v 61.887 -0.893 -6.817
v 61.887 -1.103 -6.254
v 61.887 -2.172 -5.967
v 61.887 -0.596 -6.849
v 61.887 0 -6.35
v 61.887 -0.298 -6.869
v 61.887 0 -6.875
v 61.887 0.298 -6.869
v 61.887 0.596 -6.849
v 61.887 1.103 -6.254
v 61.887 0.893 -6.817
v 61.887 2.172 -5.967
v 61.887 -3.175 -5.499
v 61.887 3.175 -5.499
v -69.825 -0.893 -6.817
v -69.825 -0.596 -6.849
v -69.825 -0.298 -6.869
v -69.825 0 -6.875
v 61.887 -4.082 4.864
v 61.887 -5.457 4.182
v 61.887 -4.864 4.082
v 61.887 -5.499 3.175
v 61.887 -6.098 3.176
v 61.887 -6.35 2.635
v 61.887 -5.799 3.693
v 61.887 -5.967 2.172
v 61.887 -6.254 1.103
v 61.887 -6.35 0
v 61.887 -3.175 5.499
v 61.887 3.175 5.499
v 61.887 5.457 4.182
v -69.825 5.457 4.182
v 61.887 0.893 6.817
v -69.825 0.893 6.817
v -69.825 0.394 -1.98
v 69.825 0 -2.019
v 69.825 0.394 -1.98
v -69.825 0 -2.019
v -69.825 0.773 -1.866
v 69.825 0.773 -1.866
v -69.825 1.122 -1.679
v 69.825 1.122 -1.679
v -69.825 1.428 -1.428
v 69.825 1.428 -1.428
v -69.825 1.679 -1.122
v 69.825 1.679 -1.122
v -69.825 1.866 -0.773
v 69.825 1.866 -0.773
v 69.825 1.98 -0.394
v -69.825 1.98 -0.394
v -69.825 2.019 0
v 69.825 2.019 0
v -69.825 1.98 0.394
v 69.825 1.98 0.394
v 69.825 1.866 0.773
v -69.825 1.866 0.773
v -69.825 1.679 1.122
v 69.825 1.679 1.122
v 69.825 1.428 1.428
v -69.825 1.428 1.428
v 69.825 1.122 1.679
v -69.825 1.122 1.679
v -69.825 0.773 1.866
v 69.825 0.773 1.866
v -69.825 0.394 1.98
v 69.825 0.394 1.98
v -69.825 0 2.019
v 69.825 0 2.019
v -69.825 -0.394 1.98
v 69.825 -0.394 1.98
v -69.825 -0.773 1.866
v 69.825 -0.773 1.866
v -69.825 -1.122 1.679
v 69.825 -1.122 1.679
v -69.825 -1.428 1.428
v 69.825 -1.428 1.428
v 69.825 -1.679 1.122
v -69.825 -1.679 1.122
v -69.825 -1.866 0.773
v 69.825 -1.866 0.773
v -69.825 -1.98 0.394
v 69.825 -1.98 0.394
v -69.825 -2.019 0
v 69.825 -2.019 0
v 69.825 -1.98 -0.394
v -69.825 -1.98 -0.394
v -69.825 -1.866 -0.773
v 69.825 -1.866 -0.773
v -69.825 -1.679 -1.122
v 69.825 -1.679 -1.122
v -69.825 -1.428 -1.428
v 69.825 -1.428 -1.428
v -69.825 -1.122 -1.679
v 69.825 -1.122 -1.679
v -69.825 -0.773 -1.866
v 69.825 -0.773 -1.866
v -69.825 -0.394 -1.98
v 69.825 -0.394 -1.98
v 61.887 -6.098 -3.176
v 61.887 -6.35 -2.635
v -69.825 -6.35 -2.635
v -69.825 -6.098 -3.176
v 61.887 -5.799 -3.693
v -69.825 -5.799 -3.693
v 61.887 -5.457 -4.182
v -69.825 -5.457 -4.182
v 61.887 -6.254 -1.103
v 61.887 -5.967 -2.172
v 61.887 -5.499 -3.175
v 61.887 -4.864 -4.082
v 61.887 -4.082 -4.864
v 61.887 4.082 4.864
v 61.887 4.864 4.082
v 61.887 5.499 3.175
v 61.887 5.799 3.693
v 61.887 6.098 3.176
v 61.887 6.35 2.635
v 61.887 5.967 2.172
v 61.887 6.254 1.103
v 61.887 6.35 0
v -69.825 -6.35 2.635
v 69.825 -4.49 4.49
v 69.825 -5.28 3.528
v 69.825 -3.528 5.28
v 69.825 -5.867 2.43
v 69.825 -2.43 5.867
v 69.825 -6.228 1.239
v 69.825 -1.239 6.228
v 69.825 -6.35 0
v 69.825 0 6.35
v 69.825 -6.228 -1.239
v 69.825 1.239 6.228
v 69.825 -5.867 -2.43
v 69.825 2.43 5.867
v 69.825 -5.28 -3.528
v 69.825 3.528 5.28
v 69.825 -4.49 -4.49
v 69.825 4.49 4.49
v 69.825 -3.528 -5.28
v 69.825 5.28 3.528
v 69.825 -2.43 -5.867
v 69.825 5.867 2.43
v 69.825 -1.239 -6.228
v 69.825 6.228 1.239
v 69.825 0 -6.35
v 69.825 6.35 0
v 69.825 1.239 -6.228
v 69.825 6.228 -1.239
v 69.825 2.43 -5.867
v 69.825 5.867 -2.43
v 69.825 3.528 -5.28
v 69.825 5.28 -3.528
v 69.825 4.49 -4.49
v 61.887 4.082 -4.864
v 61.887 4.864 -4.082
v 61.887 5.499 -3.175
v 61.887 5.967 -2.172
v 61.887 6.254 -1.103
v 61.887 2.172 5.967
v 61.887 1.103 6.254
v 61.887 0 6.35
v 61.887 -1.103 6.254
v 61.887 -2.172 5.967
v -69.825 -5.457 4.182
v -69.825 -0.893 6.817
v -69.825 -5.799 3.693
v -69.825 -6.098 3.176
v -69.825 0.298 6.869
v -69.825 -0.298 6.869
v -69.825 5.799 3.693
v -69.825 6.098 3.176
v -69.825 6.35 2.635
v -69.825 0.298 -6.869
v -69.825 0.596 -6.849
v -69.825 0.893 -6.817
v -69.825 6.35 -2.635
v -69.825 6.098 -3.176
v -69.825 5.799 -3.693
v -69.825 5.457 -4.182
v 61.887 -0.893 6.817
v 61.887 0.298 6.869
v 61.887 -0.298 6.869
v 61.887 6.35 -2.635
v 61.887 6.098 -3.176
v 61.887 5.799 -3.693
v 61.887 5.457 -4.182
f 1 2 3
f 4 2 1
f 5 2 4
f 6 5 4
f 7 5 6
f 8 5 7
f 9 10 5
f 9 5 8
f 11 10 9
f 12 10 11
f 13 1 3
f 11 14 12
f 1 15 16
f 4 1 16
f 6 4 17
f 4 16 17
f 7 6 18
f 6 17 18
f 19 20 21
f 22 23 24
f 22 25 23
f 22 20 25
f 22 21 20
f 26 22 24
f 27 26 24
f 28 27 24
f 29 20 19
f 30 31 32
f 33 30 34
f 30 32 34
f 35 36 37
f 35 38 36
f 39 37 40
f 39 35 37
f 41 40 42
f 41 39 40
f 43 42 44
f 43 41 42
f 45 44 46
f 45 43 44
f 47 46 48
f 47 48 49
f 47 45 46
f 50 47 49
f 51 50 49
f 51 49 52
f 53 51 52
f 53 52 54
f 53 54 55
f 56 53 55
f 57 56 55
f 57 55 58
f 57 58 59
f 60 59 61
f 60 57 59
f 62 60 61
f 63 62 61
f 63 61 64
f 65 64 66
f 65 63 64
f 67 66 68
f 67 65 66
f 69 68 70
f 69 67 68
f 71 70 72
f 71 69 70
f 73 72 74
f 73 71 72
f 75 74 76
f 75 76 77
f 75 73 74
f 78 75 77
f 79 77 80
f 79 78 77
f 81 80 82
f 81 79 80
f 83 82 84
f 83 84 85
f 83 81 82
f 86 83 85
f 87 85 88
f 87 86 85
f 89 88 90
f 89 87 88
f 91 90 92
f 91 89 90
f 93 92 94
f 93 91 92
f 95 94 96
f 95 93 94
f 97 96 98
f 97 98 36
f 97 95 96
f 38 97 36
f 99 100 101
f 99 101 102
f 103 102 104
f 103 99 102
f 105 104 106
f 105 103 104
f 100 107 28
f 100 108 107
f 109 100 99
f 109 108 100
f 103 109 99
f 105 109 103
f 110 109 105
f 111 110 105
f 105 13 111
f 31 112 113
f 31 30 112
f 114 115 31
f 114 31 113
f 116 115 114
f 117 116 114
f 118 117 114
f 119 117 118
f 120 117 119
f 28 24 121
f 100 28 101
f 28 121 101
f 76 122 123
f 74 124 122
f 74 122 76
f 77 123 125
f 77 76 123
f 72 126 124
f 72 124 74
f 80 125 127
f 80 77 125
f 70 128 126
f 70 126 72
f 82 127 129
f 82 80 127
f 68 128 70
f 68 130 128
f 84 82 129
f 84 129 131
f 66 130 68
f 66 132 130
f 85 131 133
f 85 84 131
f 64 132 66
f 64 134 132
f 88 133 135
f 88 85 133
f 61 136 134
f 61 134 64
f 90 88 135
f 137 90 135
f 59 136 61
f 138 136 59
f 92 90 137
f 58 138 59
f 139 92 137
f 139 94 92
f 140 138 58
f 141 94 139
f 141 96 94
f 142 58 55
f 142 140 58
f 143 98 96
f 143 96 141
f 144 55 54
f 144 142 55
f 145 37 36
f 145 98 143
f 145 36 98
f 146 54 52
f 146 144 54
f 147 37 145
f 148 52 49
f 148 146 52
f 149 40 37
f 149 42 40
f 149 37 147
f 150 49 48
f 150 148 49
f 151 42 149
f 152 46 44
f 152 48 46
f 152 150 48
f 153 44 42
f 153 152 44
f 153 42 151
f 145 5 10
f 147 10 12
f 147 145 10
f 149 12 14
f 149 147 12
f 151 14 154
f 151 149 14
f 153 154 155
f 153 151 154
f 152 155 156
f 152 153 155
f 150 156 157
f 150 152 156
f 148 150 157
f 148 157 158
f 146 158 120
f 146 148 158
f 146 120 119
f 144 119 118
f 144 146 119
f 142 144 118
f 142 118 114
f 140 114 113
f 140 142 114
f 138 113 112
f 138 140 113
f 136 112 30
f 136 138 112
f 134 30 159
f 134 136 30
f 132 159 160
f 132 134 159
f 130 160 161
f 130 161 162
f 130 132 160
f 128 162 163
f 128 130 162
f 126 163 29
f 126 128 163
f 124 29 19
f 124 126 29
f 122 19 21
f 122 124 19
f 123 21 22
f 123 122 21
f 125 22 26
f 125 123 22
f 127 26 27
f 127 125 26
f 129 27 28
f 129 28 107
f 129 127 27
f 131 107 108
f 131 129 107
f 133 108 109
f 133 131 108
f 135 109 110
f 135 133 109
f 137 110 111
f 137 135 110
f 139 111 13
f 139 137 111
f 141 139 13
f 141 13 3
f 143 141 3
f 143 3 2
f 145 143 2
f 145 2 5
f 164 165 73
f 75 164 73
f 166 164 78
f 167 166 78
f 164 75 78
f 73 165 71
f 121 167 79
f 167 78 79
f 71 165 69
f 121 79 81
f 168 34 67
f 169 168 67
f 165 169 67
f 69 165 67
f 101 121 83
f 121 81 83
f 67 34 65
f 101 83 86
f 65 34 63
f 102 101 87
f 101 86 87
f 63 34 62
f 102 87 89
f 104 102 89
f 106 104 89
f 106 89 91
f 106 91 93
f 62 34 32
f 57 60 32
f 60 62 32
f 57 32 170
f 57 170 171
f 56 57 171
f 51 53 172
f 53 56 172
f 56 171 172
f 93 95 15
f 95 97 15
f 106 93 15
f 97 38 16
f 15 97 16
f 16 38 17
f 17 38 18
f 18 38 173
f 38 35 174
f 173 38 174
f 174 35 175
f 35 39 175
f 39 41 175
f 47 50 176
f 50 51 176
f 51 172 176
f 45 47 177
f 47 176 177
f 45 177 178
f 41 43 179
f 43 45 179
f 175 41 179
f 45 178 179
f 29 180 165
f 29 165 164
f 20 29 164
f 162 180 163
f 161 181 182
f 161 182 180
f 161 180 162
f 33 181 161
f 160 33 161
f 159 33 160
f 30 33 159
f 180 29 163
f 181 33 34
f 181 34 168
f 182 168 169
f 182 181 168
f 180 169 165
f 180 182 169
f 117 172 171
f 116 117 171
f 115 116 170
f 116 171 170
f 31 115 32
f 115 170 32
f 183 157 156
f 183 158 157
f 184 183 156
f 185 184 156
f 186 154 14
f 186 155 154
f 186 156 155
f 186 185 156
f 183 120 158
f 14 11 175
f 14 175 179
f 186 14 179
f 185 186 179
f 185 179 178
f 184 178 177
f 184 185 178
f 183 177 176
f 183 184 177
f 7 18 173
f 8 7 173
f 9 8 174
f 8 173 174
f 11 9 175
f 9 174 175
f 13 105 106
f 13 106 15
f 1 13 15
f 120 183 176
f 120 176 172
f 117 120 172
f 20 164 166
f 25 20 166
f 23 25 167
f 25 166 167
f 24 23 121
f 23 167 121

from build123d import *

# Parameters (mm, degrees)
SKETCH1_R                            = 2.0193
BOSS_EXTRUDE1_DEPTH                  = 69.8246
F_10_32_TAPPED_HOLE1_D               = 4.0386
F_10_32_TAPPED_HOLE1_DEPTH           = 16.34744
F_10_32_TAPPED_HOLE1_TIP             = 1.213317848
F_10_32_TAPPED_HOLE1_ON_FACE_2_D     = 4.0386
F_10_32_TAPPED_HOLE1_ON_FACE_2_DEPTH = 16.34744
F_10_32_TAPPED_HOLE1_ON_FACE_2_TIP   = 1.213317848
SKETCH3_R                            = 8.89
SKETCH3_R_2                          = 6.35
CUT_EXTRUDE_THIN1_DEPTH              = 7.9375


with BuildPart() as part:
    # Sketch1 → Boss-Extrude1 (new, symmetric)
    with BuildSketch(Plane(origin=(0, 0, 0), x_dir=(0, 0, -1), z_dir=(1, 0, 0))):
        with BuildLine():
            ThreePointArc((4.181770846, 5.456960429), (3.437499983, 5.953924622), (2.634980936, 6.35))
            Line((2.634980936, 6.35), (-2.634980936, 6.35))
            ThreePointArc((-2.634980936, 6.35), (-3.437499983, 5.953924622), (-4.181770846, 5.456960429))
            Line((-4.181770846, 5.456960429), (-6.816751782, 0.893039571))
            ThreePointArc((-6.816751782, 0.893039571), (-6.874999966, 0), (-6.816751782, -0.893039571))
            Line((-6.816751782, -0.893039571), (-4.181770846, -5.456960429))
            ThreePointArc((-4.181770846, -5.456960429), (-3.437499983, -5.953924622), (-2.634980936, -6.35))
            Line((-2.634980936, -6.35), (2.634980936, -6.35))
            ThreePointArc((2.634980936, -6.35), (3.437499983, -5.953924622), (4.181770846, -5.456960429))
            Line((4.181770846, -5.456960429), (6.816751782, -0.893039571))
            ThreePointArc((6.816751782, -0.893039571), (6.860422465, -0.447468582), (6.874999966, 0))
            ThreePointArc((6.874999966, 0), (6.860422465, 0.447468582), (6.816751782, 0.893039571))
            Line((6.816751782, 0.893039571), (4.181770846, 5.456960429))
        make_face()
        Circle(SKETCH1_R, mode=Mode.SUBTRACT)
    extrude(amount=BOSS_EXTRUDE1_DEPTH, both=True)

    # #10-32 Tapped Hole1
    with Locations(Plane(origin=(69.8246, 0, 0), x_dir=(0, 0, 1), z_dir=(1, 0, 0))):
        with Locations((0, 0)):
            Hole(F_10_32_TAPPED_HOLE1_D / 2, depth=F_10_32_TAPPED_HOLE1_DEPTH)
            with Locations((0, 0, -(F_10_32_TAPPED_HOLE1_DEPTH + F_10_32_TAPPED_HOLE1_TIP / 2))):  # 118° drill point
                Cone(0, F_10_32_TAPPED_HOLE1_D / 2, F_10_32_TAPPED_HOLE1_TIP, mode=Mode.SUBTRACT)

    # #10-32 Tapped Hole1 on face 2
    with Locations(Plane(origin=(-69.8246, 0, 0), x_dir=(0, 0, 1), z_dir=(1, 0, 0))):
        with Locations((0, 0)):
            Hole(F_10_32_TAPPED_HOLE1_ON_FACE_2_D / 2, depth=F_10_32_TAPPED_HOLE1_ON_FACE_2_DEPTH)
            with Locations((0, 0, -(F_10_32_TAPPED_HOLE1_ON_FACE_2_DEPTH + F_10_32_TAPPED_HOLE1_ON_FACE_2_TIP / 2))):  # 118° drill point
                Cone(0, F_10_32_TAPPED_HOLE1_ON_FACE_2_D / 2, F_10_32_TAPPED_HOLE1_ON_FACE_2_TIP, mode=Mode.SUBTRACT)

    # Sketch3 → Cut-Extrude-Thin1 (cut)
    with BuildSketch(Plane(origin=(69.8246, 0, 0), x_dir=(0, 0, -1), z_dir=(1, 0, 0))):
        Circle(SKETCH3_R)
        Circle(SKETCH3_R_2, mode=Mode.SUBTRACT)
    extrude(amount=-CUT_EXTRUDE_THIN1_DEPTH, mode=Mode.SUBTRACT)


solid = part.part
